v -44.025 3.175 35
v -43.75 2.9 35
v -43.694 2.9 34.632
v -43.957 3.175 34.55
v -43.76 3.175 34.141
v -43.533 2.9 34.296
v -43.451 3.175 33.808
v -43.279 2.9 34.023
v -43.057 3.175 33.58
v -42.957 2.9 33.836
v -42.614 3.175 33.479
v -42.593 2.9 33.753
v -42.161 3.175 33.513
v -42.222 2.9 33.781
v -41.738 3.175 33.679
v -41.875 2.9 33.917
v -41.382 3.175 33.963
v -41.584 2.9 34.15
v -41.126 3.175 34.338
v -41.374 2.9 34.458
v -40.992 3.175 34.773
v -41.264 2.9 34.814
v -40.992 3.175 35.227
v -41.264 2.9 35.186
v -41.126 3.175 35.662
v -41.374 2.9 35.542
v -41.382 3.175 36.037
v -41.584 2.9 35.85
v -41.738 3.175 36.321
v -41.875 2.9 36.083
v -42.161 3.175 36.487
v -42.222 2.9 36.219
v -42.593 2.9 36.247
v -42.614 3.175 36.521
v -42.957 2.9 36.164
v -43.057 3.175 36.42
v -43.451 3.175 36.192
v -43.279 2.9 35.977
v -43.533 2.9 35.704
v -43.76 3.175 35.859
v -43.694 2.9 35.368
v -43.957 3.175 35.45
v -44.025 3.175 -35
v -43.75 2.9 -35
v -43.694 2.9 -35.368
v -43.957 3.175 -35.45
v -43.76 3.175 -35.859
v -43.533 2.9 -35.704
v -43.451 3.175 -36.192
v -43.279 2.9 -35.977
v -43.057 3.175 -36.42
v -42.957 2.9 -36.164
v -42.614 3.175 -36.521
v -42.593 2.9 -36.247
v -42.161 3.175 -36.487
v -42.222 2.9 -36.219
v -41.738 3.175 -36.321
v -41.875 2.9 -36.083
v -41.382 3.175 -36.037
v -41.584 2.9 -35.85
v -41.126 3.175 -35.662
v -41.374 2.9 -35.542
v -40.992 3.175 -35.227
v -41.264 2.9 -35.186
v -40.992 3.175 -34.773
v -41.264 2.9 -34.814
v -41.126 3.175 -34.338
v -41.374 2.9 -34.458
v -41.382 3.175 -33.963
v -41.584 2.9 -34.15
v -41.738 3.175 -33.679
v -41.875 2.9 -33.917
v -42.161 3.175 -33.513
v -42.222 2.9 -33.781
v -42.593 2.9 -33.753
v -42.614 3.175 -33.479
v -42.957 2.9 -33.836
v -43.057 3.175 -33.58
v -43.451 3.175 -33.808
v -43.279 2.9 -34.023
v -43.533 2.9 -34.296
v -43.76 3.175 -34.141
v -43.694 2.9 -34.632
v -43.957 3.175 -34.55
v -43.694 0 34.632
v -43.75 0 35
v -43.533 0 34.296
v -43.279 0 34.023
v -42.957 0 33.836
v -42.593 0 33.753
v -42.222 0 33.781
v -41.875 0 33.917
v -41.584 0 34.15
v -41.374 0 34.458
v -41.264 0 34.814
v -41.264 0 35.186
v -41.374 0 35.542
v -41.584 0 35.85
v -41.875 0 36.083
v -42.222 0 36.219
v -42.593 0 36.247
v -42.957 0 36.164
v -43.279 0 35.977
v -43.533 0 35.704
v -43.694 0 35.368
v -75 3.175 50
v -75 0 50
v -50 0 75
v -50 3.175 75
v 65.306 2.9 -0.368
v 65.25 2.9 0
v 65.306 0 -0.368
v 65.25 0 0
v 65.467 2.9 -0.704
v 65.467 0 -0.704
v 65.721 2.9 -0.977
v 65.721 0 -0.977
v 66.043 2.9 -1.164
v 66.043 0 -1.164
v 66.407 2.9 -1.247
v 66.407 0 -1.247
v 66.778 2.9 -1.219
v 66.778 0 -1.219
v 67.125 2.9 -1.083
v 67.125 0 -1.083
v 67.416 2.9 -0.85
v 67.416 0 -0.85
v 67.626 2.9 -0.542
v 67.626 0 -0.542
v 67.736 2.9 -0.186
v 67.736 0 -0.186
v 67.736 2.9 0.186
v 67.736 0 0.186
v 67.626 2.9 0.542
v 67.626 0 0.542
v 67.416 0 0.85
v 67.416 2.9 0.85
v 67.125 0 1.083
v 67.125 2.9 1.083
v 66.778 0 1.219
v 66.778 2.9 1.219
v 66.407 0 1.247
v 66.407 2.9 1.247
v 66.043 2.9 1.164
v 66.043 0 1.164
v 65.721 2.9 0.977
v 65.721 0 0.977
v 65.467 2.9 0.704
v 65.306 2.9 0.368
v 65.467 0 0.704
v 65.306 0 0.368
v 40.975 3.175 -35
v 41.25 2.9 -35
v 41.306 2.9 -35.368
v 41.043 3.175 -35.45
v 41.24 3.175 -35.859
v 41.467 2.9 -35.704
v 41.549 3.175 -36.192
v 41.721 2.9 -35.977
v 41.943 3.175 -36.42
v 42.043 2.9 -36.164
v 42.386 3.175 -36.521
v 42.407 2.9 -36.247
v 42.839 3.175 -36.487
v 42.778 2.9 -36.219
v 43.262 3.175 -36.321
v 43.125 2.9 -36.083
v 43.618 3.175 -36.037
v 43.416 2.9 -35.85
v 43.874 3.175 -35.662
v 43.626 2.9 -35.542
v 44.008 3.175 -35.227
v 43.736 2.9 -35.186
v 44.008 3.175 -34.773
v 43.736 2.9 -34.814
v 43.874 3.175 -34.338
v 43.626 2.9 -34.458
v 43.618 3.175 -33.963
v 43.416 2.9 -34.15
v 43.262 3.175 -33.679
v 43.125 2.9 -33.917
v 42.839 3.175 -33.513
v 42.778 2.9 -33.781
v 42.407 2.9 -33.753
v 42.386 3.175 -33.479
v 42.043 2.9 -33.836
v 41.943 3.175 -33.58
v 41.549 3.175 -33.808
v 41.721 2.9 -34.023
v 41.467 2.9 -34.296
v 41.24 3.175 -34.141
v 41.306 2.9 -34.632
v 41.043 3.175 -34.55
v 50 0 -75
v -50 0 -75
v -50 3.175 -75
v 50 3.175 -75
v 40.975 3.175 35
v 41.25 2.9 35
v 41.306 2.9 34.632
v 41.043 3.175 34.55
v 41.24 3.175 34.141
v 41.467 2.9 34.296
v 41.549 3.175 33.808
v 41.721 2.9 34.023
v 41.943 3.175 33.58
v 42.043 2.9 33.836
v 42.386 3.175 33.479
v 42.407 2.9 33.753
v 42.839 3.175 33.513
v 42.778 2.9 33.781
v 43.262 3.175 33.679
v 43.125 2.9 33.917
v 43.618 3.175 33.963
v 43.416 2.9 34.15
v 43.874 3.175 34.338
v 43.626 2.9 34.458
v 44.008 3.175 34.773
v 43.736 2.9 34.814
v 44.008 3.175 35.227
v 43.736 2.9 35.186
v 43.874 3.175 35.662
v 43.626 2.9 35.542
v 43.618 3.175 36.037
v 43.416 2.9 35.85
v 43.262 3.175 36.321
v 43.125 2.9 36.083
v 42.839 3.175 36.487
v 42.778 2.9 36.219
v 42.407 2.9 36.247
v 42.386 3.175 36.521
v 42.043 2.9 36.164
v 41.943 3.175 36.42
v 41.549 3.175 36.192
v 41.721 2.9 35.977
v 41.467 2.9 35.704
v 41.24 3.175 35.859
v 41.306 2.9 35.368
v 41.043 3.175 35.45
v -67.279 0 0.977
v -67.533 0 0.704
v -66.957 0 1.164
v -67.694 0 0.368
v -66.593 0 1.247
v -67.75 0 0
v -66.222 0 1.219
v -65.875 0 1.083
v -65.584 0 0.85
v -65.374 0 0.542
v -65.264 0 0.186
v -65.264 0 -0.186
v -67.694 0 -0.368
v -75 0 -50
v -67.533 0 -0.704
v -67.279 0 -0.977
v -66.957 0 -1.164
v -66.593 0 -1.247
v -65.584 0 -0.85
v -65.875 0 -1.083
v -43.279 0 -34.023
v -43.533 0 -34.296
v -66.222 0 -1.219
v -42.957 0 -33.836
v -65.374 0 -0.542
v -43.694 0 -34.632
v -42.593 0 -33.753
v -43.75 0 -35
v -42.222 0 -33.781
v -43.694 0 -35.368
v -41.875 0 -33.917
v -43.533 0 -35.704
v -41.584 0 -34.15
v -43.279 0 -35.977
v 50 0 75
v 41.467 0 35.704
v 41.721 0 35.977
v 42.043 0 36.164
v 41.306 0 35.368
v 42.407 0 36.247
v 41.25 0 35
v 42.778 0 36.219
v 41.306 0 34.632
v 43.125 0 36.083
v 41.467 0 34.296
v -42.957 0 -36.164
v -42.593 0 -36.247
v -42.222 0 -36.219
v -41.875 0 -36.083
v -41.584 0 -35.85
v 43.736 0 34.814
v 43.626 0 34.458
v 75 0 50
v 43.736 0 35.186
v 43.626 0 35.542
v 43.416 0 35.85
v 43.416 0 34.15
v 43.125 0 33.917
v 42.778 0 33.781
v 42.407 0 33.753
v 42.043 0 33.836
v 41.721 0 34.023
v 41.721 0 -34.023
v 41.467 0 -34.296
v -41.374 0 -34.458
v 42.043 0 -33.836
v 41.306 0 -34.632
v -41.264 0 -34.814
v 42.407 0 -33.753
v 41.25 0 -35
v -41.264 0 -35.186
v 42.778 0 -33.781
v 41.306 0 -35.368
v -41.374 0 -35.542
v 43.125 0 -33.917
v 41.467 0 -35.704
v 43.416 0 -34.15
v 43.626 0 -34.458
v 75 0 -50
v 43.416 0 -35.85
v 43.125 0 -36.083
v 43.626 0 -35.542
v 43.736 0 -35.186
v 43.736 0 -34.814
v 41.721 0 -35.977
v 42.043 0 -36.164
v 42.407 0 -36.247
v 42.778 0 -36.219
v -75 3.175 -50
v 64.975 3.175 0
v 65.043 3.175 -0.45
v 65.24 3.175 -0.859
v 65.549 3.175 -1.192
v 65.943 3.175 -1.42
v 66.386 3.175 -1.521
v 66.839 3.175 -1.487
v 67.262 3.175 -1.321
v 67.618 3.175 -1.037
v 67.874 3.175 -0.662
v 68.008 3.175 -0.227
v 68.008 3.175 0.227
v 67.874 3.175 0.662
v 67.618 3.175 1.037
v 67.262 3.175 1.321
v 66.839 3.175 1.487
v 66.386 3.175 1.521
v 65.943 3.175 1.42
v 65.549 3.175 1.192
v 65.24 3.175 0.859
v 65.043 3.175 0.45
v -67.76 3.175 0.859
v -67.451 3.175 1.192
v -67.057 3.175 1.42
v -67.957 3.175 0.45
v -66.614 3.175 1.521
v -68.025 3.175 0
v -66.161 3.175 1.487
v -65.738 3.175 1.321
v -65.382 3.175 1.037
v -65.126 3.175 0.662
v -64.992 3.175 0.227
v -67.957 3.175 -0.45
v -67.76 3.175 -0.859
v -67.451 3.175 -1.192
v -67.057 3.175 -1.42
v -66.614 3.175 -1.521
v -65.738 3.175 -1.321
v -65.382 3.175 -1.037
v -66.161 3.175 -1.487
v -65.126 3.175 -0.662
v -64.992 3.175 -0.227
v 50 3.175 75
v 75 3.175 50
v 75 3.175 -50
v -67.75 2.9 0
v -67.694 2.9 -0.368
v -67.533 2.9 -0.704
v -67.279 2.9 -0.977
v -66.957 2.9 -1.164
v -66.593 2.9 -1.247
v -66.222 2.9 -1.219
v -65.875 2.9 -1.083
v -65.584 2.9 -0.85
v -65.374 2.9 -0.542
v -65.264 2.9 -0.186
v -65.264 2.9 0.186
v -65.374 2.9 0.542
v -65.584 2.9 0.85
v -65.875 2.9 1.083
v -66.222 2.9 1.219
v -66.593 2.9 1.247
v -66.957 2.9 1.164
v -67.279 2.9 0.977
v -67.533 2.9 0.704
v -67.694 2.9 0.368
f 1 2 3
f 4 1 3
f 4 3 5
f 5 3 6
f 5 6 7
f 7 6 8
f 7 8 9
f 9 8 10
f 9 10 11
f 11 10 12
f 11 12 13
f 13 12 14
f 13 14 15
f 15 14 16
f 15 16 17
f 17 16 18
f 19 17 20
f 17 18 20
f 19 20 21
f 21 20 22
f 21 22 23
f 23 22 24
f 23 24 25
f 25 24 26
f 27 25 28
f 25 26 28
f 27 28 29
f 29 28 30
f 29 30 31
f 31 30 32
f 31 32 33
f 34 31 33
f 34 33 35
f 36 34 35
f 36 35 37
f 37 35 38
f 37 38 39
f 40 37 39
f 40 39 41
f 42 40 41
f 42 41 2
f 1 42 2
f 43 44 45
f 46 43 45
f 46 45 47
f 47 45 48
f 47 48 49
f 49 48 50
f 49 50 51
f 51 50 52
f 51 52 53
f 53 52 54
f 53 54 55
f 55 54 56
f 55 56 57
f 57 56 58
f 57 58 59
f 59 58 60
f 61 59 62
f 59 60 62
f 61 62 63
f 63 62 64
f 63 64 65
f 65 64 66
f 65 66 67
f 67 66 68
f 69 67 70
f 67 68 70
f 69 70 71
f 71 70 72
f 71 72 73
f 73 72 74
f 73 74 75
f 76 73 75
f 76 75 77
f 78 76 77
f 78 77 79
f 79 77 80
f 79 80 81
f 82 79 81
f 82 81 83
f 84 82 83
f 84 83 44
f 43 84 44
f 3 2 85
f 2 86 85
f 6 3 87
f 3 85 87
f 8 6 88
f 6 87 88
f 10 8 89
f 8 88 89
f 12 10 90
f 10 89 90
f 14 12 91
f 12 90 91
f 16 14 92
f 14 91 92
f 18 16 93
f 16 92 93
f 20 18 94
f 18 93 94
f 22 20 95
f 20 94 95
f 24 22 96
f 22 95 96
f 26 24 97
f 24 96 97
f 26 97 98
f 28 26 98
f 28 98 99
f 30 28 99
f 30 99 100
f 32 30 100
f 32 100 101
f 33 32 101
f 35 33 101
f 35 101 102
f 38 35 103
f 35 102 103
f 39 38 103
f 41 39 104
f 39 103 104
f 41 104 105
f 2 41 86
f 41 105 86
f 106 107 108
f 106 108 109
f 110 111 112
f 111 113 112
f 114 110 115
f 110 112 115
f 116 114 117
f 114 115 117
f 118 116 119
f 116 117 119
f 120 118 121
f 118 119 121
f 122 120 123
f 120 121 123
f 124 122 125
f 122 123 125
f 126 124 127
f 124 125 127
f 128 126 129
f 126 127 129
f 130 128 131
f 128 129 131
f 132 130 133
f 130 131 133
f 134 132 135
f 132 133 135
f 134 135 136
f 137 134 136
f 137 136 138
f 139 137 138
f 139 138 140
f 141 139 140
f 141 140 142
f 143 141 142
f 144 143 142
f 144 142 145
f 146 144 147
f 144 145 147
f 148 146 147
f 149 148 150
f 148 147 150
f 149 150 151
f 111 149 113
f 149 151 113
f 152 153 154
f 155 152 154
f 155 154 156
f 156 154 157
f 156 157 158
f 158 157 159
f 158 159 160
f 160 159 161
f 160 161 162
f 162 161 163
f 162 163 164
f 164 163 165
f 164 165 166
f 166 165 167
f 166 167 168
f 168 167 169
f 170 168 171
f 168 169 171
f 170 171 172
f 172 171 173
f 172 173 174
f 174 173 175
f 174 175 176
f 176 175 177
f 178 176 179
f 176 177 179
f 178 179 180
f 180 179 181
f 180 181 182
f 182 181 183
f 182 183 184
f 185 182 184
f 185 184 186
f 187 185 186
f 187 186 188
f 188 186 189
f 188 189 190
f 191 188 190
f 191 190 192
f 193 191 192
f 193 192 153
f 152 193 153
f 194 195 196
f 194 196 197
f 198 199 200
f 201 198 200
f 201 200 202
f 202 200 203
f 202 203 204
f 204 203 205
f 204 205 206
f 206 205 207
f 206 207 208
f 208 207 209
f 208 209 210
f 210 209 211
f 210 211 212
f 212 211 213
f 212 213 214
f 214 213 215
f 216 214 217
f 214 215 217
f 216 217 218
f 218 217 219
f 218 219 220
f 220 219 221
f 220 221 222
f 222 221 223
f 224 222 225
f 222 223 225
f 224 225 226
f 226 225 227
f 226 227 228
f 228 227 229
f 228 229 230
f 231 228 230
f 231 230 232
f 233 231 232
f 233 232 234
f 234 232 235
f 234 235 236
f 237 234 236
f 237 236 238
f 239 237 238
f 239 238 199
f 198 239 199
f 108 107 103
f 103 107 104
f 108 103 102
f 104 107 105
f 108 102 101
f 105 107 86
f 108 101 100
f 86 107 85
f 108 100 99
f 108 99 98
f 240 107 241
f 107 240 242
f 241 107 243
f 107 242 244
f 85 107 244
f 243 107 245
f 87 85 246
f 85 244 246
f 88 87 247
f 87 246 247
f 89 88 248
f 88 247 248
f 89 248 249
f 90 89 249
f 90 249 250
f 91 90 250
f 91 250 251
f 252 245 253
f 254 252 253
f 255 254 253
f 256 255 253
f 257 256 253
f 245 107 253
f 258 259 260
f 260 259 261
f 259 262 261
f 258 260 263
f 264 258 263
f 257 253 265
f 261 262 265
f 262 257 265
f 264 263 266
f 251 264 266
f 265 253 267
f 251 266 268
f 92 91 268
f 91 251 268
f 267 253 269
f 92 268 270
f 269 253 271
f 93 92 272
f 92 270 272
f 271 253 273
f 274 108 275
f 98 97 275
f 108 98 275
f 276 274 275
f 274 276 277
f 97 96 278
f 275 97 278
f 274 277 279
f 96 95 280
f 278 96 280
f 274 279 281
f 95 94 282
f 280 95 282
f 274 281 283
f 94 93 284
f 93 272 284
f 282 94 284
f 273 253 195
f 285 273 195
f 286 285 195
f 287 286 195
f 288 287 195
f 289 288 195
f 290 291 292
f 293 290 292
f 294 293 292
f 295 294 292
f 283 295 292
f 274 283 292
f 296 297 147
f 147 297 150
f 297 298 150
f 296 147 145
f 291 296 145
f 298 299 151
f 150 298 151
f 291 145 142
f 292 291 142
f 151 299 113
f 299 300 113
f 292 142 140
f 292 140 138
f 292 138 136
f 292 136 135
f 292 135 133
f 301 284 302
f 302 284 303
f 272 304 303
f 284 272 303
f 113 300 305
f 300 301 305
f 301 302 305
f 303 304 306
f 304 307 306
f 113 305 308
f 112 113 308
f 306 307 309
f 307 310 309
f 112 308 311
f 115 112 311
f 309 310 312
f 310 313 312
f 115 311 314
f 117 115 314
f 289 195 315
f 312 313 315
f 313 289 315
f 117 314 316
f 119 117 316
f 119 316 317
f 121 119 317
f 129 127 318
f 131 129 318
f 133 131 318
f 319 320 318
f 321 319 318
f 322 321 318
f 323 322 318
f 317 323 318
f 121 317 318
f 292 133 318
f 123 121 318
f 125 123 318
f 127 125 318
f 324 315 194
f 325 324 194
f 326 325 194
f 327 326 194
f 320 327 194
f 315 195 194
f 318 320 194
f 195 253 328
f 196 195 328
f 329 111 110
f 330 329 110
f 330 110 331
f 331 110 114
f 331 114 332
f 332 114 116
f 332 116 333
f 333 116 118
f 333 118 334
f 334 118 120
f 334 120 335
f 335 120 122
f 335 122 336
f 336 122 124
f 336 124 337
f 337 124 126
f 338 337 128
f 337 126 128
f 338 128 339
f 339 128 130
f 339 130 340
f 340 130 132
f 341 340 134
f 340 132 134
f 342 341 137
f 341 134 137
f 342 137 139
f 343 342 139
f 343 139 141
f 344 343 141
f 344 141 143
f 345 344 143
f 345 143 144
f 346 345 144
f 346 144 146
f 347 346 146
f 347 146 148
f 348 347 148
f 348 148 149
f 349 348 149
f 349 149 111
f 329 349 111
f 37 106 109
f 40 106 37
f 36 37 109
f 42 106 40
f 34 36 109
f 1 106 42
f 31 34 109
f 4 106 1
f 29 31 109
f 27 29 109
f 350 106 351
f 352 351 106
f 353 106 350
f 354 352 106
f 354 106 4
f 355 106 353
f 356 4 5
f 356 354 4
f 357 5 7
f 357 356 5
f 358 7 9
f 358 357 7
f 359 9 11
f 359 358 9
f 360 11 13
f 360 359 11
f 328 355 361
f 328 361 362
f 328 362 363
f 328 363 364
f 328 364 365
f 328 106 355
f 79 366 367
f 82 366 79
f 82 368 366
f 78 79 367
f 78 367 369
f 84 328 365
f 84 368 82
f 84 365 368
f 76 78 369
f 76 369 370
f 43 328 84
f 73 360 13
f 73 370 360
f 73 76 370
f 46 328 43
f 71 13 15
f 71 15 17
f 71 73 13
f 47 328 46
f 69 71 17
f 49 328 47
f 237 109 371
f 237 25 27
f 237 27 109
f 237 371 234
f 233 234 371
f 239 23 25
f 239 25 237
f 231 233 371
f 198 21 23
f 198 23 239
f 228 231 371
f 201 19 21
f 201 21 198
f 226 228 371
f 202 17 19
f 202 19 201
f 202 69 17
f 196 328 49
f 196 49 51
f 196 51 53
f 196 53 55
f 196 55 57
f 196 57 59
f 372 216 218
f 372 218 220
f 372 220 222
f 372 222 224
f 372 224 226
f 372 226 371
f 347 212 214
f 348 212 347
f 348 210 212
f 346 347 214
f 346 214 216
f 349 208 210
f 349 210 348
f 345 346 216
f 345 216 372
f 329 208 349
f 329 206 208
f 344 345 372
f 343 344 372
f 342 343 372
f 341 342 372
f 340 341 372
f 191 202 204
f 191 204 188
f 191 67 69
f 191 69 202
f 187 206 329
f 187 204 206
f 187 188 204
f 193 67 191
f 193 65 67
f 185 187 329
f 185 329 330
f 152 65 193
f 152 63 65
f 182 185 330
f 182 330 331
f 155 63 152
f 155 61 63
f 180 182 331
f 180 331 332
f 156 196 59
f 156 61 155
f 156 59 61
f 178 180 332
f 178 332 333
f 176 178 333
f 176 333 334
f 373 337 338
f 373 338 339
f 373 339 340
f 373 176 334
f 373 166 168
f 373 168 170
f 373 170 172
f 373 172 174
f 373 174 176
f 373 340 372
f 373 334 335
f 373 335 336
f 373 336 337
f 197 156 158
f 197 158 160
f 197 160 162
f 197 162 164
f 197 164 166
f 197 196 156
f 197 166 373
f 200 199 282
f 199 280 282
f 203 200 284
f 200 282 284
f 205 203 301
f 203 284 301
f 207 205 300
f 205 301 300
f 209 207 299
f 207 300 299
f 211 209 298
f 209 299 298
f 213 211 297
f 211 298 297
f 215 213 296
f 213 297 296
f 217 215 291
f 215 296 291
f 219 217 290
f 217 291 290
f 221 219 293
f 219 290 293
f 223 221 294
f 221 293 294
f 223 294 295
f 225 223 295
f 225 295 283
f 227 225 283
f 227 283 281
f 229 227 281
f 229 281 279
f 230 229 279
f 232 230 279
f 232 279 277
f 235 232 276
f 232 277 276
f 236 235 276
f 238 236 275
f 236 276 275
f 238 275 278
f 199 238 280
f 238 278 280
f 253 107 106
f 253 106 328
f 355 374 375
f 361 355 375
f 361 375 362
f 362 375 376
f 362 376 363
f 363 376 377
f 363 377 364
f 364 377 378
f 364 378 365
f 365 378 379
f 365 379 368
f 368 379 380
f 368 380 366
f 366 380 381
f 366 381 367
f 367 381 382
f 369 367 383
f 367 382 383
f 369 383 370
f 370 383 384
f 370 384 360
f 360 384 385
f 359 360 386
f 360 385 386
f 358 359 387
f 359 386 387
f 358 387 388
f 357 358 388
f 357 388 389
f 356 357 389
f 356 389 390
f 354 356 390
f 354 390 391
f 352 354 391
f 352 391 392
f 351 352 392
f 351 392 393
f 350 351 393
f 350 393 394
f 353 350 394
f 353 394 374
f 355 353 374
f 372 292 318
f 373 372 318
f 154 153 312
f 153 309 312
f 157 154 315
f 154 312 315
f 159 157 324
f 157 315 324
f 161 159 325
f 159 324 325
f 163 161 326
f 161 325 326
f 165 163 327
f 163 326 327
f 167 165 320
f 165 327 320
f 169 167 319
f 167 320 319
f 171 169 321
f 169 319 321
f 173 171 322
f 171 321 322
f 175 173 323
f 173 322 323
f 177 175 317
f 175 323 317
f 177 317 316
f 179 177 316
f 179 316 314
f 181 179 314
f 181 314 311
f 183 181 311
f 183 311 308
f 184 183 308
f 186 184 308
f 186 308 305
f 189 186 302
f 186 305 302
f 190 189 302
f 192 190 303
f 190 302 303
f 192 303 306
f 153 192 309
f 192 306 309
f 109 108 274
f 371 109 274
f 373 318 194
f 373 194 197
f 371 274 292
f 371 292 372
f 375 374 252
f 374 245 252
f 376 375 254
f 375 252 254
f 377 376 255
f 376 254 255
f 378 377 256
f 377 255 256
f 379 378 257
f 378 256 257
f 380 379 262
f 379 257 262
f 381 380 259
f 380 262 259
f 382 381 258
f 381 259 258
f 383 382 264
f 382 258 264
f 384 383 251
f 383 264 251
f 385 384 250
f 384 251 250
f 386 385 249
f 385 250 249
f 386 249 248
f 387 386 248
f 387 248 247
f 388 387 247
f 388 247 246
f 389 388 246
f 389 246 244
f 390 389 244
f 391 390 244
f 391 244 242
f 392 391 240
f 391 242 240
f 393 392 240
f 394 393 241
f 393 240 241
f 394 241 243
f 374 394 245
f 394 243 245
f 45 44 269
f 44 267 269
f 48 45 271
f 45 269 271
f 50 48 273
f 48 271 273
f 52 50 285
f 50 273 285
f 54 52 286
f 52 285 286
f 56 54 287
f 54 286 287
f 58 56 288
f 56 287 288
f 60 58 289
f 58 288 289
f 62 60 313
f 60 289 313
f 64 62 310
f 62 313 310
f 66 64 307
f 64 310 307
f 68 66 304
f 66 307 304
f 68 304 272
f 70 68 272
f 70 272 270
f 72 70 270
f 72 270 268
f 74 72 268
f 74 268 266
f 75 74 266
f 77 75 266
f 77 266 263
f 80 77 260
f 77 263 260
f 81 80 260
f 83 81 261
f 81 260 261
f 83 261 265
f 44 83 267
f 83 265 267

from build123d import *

# Parameters (mm, degrees)
SKETCH2_W                       = 150
SKETCH2_H                       = 150
BOSS_EXTRUDE2_DEPTH             = 3.175
CHAMFER1_SIZE                   = 25
M3X0_5_TAPPED_HOLE1_D           = 2.5
M3X0_5_TAPPED_HOLE1_CSINK_D     = 3.05
M3X0_5_TAPPED_HOLE1_CSINK_ANGLE = 90


with BuildPart() as part:
    # Sketch2 → Boss-Extrude2 (new body)
    with BuildSketch(Plane(origin=(0, 0, 0), x_dir=(1, 0, 0), z_dir=(0, 1, 0))):
        Rectangle(SKETCH2_W, SKETCH2_H)
    extrude(amount=BOSS_EXTRUDE2_DEPTH)

    # Chamfer1
    chamfer1_edges = [part.edges().sort_by_distance(p)[0] for p in [
        (75, 1.5875, 75),
        (-75, 1.5875, 75),
        (-75, 1.5875, -75),
        (75, 1.5875, -75),
    ]]
    chamfer(chamfer1_edges, length=CHAMFER1_SIZE)

    # M3x0.5 Tapped Hole1 (through all)
    with Locations(Plane(origin=(0, 3.175, 0), x_dir=(1, 0, 0), z_dir=(0, 1, 0))):
        with Locations((-42.5, 35), (42.5, 35), (-42.5, -35), (42.5, -35), (-66.5, 0), (66.5, 0)):
            CounterSinkHole(M3X0_5_TAPPED_HOLE1_D / 2, M3X0_5_TAPPED_HOLE1_CSINK_D / 2, counter_sink_angle=M3X0_5_TAPPED_HOLE1_CSINK_ANGLE)


solid = part.part
